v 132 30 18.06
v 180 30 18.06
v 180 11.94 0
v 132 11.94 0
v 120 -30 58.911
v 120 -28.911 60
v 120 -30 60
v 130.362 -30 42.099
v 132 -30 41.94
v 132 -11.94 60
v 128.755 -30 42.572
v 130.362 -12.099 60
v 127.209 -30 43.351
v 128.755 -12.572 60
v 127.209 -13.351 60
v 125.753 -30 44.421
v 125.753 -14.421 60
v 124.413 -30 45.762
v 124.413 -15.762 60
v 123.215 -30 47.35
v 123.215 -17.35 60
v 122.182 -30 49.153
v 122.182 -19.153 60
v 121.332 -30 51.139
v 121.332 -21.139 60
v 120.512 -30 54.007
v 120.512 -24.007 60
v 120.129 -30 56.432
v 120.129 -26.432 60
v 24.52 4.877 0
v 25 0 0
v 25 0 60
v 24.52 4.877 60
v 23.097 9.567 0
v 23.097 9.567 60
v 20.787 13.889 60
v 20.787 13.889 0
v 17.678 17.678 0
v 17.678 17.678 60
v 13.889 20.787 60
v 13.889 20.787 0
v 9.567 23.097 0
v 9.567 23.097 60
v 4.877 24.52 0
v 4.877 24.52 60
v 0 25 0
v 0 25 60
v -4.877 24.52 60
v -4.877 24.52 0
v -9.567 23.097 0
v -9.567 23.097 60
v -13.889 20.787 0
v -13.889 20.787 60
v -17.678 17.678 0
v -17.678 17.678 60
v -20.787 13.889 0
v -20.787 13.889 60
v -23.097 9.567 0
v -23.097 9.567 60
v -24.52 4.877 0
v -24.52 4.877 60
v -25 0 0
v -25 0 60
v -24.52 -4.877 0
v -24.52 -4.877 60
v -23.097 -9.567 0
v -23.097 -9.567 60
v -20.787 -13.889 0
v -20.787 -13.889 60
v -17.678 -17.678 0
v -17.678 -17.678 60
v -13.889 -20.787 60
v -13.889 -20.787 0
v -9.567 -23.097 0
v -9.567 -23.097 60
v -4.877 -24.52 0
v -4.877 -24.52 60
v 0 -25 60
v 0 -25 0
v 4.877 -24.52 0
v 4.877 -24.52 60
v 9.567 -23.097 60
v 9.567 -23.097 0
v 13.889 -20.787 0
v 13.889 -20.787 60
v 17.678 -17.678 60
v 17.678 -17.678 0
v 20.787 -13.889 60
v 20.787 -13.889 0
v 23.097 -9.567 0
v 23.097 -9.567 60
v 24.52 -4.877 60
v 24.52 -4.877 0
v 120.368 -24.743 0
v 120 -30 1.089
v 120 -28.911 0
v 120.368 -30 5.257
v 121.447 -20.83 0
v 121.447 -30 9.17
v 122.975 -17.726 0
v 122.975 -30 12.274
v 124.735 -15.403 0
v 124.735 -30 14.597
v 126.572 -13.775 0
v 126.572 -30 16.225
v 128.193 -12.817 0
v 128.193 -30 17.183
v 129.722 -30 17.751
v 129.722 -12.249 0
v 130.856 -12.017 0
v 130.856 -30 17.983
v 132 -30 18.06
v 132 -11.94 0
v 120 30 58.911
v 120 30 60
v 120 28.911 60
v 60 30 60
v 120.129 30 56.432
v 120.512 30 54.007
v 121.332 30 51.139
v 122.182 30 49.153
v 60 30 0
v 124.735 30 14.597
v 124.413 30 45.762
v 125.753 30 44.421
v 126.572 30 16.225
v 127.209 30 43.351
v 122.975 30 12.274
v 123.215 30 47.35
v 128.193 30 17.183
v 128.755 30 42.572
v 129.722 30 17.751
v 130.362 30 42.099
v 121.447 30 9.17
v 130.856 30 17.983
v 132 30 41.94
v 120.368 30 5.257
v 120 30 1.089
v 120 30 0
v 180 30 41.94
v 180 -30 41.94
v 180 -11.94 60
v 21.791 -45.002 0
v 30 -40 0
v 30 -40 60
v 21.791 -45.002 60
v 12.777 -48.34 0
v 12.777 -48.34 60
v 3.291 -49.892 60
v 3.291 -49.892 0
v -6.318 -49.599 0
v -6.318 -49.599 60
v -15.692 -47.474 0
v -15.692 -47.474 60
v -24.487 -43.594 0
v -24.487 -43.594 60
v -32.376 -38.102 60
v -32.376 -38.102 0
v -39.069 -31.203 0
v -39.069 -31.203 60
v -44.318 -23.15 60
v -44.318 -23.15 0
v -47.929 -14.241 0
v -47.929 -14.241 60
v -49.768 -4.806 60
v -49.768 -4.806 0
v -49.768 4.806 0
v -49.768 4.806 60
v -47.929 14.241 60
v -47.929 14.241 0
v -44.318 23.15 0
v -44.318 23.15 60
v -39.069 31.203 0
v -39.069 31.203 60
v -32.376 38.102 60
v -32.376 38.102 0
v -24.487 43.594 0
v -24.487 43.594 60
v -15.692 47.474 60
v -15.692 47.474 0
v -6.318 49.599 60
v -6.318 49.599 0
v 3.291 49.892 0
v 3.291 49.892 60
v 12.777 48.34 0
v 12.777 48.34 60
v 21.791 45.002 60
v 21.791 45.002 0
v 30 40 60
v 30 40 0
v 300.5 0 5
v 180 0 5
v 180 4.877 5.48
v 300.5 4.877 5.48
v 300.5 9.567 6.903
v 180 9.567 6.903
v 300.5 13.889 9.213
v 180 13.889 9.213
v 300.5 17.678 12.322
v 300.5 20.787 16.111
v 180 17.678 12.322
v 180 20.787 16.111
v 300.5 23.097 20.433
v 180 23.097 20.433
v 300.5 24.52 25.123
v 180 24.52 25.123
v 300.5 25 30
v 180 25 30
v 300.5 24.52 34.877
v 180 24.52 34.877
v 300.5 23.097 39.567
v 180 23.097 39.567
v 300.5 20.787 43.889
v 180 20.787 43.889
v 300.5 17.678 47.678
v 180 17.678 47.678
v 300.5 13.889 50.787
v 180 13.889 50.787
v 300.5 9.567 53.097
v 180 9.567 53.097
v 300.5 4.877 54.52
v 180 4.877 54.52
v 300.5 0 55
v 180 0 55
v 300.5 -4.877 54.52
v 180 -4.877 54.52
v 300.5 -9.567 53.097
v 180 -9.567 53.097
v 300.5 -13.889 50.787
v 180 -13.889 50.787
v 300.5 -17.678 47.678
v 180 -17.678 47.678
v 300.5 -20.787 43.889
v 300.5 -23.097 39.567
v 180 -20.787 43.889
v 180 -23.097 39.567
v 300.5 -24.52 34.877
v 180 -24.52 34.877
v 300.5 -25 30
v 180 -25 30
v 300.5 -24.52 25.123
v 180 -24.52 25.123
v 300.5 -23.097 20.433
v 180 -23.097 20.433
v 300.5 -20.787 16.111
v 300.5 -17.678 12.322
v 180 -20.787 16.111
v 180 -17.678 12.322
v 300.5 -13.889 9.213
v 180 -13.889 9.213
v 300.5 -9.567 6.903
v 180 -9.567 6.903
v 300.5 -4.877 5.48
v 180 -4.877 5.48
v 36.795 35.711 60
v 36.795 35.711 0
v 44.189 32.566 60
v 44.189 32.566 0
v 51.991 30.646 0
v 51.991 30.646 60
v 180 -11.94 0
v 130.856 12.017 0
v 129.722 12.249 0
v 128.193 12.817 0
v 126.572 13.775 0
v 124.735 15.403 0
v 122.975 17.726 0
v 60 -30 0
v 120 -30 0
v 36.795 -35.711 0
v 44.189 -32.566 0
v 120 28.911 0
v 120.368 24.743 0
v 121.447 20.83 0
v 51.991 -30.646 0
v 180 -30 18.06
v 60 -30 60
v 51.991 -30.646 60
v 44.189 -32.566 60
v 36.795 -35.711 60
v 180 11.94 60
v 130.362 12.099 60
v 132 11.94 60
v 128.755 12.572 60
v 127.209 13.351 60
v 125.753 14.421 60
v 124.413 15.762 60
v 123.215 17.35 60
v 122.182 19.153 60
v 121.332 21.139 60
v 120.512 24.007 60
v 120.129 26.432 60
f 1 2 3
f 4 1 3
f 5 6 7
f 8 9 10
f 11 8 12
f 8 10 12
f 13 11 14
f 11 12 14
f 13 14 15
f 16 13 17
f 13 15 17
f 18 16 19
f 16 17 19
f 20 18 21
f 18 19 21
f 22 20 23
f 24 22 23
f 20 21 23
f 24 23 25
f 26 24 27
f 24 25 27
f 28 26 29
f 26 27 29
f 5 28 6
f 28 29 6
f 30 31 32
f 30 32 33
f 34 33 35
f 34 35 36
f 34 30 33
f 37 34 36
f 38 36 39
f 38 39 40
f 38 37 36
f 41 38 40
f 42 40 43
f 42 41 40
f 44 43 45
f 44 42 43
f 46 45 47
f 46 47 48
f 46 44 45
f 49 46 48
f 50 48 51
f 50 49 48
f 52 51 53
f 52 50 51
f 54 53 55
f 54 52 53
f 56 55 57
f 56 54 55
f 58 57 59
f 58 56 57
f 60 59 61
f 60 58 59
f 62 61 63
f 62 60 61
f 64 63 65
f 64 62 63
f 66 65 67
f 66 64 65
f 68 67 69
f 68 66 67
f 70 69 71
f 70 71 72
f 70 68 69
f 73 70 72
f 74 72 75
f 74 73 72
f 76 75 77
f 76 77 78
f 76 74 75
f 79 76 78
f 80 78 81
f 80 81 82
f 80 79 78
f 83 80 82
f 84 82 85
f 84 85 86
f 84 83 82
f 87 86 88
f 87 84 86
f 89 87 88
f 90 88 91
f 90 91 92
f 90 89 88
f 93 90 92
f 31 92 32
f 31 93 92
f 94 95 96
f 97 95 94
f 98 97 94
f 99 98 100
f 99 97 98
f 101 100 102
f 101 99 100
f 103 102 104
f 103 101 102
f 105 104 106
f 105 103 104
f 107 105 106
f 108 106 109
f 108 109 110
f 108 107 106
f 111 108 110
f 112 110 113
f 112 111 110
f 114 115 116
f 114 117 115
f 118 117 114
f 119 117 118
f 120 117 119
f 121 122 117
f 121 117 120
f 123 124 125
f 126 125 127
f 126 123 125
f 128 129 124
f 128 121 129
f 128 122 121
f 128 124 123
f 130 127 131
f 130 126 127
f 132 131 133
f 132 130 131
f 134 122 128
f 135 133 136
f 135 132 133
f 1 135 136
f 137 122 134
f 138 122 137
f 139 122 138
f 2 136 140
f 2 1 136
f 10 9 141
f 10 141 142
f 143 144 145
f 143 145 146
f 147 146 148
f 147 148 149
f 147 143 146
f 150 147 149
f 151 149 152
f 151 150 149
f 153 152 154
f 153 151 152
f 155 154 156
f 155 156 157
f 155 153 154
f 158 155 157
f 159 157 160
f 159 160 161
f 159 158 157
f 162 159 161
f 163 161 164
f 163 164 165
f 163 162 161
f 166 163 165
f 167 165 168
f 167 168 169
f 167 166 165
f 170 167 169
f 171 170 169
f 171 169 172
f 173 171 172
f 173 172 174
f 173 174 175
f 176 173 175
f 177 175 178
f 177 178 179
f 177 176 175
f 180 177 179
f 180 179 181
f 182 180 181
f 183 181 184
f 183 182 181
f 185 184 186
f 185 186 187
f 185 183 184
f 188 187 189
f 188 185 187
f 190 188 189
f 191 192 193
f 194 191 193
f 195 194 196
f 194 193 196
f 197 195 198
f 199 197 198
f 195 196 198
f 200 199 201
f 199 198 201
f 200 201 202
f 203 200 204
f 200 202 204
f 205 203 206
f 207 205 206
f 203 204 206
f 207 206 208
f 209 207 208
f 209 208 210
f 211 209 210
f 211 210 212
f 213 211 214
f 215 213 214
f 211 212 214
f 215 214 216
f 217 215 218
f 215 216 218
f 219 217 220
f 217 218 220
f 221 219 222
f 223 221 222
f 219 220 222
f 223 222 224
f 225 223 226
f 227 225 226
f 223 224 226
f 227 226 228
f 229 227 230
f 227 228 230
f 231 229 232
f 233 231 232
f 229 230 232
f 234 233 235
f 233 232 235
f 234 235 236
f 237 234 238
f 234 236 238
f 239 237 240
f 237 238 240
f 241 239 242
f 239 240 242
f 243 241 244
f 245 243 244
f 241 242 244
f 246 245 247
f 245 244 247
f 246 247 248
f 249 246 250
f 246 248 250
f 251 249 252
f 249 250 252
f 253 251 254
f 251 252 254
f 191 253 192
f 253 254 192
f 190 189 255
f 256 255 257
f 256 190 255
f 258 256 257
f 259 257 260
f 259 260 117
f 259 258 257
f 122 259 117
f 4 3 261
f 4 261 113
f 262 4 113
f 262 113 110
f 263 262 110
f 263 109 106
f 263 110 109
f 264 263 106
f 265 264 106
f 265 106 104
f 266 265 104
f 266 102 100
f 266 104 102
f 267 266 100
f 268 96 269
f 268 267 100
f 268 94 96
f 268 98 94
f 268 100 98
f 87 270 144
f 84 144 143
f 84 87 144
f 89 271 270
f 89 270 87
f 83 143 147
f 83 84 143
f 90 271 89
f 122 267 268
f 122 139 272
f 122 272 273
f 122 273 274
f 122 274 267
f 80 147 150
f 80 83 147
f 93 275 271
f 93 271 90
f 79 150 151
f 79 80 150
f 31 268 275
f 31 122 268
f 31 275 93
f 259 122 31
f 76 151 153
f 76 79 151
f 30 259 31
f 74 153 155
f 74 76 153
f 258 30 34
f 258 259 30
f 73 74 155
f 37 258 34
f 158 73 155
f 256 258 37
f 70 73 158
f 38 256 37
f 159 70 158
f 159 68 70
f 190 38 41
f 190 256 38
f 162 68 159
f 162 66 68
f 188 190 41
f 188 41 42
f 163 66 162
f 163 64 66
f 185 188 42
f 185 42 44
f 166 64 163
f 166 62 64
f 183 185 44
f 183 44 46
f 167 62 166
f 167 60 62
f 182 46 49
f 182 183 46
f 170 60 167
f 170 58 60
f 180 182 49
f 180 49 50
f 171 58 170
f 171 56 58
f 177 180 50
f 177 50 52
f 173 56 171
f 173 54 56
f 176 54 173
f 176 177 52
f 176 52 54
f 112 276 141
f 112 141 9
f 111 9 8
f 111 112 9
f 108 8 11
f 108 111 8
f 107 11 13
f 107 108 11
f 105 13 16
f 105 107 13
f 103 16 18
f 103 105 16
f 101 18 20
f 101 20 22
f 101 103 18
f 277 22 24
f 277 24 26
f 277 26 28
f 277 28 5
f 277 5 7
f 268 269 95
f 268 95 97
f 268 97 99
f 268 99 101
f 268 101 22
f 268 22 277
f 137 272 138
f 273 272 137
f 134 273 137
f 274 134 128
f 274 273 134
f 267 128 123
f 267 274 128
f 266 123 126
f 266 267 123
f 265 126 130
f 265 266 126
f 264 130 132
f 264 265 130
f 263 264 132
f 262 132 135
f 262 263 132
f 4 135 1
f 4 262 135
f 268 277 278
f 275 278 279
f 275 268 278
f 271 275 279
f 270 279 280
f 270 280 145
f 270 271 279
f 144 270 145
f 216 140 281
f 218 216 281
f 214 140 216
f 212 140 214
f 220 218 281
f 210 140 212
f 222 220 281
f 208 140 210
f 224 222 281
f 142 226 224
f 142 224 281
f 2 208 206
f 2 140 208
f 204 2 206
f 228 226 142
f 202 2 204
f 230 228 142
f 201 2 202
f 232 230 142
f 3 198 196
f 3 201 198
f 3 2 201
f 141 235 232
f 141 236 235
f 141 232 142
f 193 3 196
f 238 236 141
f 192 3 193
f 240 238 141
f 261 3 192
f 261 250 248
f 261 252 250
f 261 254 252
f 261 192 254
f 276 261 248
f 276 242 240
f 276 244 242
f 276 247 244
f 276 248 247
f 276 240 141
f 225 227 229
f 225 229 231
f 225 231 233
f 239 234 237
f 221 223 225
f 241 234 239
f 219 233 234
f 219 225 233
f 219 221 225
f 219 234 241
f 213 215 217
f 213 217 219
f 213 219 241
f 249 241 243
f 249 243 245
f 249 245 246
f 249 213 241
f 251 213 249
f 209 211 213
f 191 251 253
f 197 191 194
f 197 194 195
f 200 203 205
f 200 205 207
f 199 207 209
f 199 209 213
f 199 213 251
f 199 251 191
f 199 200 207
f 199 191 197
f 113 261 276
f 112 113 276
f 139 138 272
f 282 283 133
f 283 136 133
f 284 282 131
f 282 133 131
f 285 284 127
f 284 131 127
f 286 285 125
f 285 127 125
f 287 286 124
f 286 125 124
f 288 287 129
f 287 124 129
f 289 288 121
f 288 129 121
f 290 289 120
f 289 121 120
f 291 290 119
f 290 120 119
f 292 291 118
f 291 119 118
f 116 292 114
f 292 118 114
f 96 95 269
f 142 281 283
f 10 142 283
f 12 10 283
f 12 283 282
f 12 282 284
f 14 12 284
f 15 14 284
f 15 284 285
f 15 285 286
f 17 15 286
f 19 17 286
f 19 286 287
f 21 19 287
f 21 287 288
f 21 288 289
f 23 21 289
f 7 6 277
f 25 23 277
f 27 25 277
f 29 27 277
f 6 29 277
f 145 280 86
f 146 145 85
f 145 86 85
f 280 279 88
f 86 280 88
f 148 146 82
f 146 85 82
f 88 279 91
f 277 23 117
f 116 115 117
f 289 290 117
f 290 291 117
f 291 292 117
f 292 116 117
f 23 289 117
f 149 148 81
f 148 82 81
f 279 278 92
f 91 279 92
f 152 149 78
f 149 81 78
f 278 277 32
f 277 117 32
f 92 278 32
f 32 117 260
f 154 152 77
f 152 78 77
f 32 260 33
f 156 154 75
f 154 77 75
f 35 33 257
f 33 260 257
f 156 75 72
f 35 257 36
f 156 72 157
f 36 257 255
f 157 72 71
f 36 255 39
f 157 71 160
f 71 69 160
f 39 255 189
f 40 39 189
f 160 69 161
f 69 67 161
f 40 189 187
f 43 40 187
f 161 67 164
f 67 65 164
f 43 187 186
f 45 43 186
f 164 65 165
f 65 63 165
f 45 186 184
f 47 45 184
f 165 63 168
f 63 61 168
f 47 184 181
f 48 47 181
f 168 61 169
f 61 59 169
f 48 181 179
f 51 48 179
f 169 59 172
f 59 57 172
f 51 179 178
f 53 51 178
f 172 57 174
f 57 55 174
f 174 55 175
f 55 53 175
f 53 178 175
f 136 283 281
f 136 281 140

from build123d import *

# Parameters (mm, degrees)
SKETCH1_R           = 25
BOSS_EXTRUDE1_DEPTH = 60
CUT_EXTRUDE1_DEPTH  = 60
SKETCH2_3_R         = 25
BOSS_EXTRUDE2_DEPTH = 120.5
FILLET1_R           = 12


with BuildPart() as part:
    # Sketch1 → Boss-Extrude1 (new body)
    with BuildSketch(Plane.XY):
        with BuildLine():
            Line((60, 30), (180, 30))
            Line((180, 30), (180, -30))
            Line((180, -30), (60, -30))
            ThreePointArc((60, -30), (44.188611699, -32.565835097), (30, -40))
            ThreePointArc((30, -40), (-50, 0), (30, 40))
            ThreePointArc((30, 40), (44.188611699, 32.565835097), (60, 30))
        make_face()
        Circle(SKETCH1_R, mode=Mode.SUBTRACT)
    extrude(amount=BOSS_EXTRUDE1_DEPTH)

    # Sketch2 → Cut-Extrude1 (cut)
    with BuildSketch(Plane(origin=(180, 0, 0), x_dir=(0, 0, -1), z_dir=(1, 0, 0))):
        Polygon((-18.06, 30), (0, 11.94), (0, 30), align=None)
        Polygon((0, -30), (0, -11.94), (-18.06, -30), align=None)
        Polygon((-60, 11.94), (-41.94, 30), (-60, 30), align=None)
        Polygon((-60, -30), (-41.94, -30), (-60, -11.94), align=None)
    extrude(amount=-CUT_EXTRUDE1_DEPTH, mode=Mode.SUBTRACT)

    # Sketch2<3> → Boss-Extrude2 (add)
    with BuildSketch(Plane(origin=(180, 0, 0), x_dir=(0, 0, -1), z_dir=(1, 0, 0))):
        with Locations((-30, 0)):
            Circle(SKETCH2_3_R)
    extrude(amount=BOSS_EXTRUDE2_DEPTH)

    # Fillet1
    fillet1_edges = [part.edges().sort_by_distance(p)[0] for p in [
        (120, -20.97, 9.03),
        (120, 20.97, 9.03),
        (120, -20.97, 50.97),
        (120, 20.97, 50.97),
    ]]
    fillet(fillet1_edges, radius=FILLET1_R)


solid = part.part
